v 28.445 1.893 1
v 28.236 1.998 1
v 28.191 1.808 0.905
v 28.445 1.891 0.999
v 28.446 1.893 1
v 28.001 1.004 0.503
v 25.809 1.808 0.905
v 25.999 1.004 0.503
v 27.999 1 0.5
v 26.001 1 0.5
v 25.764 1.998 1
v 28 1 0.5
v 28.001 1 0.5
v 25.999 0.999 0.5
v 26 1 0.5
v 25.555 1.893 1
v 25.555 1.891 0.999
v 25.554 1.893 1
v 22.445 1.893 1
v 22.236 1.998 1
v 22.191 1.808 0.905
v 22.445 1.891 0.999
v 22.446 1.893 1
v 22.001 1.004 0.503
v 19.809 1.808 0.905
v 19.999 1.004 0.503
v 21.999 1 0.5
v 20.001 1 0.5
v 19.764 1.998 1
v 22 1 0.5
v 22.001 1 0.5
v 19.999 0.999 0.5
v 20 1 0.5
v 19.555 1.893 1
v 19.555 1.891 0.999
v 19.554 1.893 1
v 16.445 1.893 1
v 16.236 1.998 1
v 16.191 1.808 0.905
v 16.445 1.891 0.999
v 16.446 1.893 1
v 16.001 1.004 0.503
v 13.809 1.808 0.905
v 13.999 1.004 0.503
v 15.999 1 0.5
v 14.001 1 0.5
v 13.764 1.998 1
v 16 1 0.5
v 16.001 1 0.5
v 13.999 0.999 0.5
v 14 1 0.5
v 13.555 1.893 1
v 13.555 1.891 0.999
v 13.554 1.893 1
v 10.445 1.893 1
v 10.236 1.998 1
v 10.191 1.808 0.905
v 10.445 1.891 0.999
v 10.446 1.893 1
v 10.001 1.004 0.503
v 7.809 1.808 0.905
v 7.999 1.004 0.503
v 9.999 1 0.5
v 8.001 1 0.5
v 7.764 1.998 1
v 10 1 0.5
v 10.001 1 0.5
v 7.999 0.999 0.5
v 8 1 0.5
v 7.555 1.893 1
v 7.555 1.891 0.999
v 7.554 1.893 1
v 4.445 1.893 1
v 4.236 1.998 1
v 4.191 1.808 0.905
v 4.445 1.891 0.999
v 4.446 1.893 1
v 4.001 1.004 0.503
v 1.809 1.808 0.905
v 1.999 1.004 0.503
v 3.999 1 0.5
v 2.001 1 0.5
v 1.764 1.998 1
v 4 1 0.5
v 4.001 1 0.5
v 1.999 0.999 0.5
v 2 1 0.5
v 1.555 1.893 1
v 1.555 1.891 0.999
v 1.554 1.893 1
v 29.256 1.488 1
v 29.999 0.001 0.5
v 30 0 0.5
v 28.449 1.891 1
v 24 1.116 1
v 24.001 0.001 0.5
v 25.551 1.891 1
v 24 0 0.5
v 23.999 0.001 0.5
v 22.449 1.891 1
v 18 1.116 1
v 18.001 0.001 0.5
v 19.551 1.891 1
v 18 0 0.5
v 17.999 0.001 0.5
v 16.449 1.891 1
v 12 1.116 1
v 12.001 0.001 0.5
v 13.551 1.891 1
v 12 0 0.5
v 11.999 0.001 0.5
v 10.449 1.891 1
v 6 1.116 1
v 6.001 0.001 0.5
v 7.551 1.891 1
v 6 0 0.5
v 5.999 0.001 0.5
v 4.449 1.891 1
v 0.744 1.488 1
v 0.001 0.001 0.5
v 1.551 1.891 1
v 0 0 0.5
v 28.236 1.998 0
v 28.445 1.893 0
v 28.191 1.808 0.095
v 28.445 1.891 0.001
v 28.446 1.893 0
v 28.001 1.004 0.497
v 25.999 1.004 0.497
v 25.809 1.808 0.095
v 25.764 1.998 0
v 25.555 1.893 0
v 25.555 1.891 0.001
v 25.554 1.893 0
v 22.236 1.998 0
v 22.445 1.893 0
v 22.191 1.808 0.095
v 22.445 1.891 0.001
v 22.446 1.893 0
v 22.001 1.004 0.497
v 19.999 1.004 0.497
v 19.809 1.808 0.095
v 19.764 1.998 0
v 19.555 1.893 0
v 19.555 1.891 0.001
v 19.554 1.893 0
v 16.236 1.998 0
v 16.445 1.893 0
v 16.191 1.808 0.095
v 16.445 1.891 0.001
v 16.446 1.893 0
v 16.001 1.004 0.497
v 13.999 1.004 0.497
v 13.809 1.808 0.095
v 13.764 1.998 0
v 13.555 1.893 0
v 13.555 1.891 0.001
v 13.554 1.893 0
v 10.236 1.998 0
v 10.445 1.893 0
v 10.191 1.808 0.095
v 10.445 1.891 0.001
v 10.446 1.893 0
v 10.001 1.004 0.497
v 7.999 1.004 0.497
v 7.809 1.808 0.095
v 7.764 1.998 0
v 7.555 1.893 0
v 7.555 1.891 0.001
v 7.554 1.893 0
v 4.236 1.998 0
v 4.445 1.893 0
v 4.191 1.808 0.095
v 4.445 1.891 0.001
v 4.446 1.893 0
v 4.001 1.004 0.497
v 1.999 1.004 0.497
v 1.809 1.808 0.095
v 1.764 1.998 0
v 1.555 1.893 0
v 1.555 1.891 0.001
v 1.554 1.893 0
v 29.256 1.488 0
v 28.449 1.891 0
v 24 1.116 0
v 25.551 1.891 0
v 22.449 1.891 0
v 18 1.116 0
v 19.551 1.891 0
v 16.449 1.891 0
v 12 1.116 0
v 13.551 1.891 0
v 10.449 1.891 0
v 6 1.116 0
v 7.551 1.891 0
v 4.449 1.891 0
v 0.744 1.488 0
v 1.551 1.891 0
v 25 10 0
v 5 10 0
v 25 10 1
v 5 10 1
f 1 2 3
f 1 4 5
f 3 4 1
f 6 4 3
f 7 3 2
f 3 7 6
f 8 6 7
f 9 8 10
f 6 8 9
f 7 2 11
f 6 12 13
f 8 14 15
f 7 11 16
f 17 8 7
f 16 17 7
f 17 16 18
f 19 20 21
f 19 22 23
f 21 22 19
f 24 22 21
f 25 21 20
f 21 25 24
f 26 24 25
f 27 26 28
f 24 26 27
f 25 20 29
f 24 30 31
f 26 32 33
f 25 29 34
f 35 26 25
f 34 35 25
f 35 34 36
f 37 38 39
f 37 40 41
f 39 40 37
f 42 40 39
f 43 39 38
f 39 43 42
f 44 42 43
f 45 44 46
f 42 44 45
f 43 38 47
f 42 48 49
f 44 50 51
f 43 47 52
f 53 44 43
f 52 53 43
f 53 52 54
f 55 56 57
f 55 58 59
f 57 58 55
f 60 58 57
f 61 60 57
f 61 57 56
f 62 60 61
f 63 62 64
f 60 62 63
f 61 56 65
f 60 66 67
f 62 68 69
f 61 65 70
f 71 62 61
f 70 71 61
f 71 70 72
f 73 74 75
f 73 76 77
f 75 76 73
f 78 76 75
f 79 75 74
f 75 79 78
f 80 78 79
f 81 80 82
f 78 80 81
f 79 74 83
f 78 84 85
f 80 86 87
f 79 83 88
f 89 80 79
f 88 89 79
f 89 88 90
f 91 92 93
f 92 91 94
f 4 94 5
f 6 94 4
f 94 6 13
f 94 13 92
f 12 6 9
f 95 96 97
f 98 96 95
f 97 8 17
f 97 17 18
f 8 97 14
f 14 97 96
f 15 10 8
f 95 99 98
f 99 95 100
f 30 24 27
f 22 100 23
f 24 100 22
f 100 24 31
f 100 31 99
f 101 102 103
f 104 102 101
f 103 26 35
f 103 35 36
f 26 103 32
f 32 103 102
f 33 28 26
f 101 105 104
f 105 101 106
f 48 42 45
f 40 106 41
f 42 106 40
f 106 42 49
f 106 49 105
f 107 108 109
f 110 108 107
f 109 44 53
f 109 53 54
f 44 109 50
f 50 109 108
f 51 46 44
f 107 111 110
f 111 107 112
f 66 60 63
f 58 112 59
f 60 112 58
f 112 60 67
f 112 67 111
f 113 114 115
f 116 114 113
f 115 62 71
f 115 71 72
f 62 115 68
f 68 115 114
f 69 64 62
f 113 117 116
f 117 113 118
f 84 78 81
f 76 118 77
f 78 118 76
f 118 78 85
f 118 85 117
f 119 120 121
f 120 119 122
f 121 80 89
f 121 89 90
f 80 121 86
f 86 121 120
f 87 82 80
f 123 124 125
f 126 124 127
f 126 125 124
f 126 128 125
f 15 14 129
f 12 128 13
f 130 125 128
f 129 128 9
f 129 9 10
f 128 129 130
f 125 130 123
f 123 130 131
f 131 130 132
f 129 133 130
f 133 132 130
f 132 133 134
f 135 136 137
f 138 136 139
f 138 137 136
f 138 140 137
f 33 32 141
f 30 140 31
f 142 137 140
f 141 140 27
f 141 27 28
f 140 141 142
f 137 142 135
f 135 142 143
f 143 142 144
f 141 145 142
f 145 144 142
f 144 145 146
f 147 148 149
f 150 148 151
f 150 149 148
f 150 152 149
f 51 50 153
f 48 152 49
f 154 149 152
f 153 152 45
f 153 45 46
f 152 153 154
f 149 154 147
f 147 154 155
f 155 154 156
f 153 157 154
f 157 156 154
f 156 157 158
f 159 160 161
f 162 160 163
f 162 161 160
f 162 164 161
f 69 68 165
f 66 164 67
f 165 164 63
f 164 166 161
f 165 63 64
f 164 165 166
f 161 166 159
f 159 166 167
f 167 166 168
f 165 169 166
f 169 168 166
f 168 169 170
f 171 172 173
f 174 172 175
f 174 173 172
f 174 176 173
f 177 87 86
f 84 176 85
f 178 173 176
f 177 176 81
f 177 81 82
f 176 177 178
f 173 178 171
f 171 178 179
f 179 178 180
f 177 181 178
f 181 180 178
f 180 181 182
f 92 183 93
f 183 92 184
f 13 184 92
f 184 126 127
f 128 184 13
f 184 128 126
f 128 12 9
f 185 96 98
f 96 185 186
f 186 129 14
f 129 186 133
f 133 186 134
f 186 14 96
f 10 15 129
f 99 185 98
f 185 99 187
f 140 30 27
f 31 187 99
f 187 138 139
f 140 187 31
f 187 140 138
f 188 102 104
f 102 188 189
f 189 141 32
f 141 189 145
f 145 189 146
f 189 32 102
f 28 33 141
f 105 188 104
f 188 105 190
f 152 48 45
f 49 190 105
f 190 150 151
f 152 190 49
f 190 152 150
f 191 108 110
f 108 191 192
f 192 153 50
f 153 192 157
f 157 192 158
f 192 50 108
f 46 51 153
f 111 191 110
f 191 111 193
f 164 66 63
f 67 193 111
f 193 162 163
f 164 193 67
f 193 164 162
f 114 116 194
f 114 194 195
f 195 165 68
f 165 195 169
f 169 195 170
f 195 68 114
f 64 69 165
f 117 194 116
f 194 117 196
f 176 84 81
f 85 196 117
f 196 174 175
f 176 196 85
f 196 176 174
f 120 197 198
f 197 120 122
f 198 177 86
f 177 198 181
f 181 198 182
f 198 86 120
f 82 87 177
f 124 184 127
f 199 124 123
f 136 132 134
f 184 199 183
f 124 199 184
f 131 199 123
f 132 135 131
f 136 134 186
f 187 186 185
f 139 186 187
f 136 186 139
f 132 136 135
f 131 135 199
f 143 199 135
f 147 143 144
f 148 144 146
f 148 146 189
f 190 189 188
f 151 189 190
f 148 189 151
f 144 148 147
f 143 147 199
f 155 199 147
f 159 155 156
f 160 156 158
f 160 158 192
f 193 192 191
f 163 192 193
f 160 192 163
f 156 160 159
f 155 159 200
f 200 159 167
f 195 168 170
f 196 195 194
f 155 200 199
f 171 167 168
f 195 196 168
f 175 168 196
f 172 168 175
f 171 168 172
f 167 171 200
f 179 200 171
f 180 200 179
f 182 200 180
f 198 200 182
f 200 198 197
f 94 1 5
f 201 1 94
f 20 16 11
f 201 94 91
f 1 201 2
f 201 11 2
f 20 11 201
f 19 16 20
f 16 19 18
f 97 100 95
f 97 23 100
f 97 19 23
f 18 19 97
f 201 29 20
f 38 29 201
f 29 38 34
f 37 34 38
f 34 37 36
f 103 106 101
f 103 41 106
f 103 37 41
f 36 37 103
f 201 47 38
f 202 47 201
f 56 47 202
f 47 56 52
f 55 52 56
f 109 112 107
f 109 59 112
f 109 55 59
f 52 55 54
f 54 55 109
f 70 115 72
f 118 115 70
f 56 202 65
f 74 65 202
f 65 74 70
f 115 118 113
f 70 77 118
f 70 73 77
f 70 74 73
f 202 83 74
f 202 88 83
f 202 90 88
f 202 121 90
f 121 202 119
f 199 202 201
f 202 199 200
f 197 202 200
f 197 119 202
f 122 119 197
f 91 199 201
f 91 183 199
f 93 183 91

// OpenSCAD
//==============================================================================
//
//           prism-chamfer - the missing chamfer tool for OpenSCAD
//
// Author:  Heath Raftery
// Origin:  http://github.com/hraftery/prism-chamfer
// License: GPLv3, see LICENSE for terms.
//
// See the accompanying README for instructions on use.
//
//==============================================================================


include <../prism-chamfer.scad>;

difference() {
  polygon_points = [[0,0],[5,10],[25,10],[30,0],[28,1],[26,1],[24,0],[22,1],[20,1],[18,0],[16,1],[14,1],[12,0],[10,1],[8,1],[6,0],[4,1],[2,1]];
  h=1;
  linear_extrude(height=h)
    polygon(polygon_points, convexity=4);

  prism_chamfer_mask(polygon_points, 3, 17, h,
                     1.0, 0.5, "deep");
  prism_chamfer_mask(polygon_points, 3, 17, 0,
                     1.0, 0.5, "deep");
}
